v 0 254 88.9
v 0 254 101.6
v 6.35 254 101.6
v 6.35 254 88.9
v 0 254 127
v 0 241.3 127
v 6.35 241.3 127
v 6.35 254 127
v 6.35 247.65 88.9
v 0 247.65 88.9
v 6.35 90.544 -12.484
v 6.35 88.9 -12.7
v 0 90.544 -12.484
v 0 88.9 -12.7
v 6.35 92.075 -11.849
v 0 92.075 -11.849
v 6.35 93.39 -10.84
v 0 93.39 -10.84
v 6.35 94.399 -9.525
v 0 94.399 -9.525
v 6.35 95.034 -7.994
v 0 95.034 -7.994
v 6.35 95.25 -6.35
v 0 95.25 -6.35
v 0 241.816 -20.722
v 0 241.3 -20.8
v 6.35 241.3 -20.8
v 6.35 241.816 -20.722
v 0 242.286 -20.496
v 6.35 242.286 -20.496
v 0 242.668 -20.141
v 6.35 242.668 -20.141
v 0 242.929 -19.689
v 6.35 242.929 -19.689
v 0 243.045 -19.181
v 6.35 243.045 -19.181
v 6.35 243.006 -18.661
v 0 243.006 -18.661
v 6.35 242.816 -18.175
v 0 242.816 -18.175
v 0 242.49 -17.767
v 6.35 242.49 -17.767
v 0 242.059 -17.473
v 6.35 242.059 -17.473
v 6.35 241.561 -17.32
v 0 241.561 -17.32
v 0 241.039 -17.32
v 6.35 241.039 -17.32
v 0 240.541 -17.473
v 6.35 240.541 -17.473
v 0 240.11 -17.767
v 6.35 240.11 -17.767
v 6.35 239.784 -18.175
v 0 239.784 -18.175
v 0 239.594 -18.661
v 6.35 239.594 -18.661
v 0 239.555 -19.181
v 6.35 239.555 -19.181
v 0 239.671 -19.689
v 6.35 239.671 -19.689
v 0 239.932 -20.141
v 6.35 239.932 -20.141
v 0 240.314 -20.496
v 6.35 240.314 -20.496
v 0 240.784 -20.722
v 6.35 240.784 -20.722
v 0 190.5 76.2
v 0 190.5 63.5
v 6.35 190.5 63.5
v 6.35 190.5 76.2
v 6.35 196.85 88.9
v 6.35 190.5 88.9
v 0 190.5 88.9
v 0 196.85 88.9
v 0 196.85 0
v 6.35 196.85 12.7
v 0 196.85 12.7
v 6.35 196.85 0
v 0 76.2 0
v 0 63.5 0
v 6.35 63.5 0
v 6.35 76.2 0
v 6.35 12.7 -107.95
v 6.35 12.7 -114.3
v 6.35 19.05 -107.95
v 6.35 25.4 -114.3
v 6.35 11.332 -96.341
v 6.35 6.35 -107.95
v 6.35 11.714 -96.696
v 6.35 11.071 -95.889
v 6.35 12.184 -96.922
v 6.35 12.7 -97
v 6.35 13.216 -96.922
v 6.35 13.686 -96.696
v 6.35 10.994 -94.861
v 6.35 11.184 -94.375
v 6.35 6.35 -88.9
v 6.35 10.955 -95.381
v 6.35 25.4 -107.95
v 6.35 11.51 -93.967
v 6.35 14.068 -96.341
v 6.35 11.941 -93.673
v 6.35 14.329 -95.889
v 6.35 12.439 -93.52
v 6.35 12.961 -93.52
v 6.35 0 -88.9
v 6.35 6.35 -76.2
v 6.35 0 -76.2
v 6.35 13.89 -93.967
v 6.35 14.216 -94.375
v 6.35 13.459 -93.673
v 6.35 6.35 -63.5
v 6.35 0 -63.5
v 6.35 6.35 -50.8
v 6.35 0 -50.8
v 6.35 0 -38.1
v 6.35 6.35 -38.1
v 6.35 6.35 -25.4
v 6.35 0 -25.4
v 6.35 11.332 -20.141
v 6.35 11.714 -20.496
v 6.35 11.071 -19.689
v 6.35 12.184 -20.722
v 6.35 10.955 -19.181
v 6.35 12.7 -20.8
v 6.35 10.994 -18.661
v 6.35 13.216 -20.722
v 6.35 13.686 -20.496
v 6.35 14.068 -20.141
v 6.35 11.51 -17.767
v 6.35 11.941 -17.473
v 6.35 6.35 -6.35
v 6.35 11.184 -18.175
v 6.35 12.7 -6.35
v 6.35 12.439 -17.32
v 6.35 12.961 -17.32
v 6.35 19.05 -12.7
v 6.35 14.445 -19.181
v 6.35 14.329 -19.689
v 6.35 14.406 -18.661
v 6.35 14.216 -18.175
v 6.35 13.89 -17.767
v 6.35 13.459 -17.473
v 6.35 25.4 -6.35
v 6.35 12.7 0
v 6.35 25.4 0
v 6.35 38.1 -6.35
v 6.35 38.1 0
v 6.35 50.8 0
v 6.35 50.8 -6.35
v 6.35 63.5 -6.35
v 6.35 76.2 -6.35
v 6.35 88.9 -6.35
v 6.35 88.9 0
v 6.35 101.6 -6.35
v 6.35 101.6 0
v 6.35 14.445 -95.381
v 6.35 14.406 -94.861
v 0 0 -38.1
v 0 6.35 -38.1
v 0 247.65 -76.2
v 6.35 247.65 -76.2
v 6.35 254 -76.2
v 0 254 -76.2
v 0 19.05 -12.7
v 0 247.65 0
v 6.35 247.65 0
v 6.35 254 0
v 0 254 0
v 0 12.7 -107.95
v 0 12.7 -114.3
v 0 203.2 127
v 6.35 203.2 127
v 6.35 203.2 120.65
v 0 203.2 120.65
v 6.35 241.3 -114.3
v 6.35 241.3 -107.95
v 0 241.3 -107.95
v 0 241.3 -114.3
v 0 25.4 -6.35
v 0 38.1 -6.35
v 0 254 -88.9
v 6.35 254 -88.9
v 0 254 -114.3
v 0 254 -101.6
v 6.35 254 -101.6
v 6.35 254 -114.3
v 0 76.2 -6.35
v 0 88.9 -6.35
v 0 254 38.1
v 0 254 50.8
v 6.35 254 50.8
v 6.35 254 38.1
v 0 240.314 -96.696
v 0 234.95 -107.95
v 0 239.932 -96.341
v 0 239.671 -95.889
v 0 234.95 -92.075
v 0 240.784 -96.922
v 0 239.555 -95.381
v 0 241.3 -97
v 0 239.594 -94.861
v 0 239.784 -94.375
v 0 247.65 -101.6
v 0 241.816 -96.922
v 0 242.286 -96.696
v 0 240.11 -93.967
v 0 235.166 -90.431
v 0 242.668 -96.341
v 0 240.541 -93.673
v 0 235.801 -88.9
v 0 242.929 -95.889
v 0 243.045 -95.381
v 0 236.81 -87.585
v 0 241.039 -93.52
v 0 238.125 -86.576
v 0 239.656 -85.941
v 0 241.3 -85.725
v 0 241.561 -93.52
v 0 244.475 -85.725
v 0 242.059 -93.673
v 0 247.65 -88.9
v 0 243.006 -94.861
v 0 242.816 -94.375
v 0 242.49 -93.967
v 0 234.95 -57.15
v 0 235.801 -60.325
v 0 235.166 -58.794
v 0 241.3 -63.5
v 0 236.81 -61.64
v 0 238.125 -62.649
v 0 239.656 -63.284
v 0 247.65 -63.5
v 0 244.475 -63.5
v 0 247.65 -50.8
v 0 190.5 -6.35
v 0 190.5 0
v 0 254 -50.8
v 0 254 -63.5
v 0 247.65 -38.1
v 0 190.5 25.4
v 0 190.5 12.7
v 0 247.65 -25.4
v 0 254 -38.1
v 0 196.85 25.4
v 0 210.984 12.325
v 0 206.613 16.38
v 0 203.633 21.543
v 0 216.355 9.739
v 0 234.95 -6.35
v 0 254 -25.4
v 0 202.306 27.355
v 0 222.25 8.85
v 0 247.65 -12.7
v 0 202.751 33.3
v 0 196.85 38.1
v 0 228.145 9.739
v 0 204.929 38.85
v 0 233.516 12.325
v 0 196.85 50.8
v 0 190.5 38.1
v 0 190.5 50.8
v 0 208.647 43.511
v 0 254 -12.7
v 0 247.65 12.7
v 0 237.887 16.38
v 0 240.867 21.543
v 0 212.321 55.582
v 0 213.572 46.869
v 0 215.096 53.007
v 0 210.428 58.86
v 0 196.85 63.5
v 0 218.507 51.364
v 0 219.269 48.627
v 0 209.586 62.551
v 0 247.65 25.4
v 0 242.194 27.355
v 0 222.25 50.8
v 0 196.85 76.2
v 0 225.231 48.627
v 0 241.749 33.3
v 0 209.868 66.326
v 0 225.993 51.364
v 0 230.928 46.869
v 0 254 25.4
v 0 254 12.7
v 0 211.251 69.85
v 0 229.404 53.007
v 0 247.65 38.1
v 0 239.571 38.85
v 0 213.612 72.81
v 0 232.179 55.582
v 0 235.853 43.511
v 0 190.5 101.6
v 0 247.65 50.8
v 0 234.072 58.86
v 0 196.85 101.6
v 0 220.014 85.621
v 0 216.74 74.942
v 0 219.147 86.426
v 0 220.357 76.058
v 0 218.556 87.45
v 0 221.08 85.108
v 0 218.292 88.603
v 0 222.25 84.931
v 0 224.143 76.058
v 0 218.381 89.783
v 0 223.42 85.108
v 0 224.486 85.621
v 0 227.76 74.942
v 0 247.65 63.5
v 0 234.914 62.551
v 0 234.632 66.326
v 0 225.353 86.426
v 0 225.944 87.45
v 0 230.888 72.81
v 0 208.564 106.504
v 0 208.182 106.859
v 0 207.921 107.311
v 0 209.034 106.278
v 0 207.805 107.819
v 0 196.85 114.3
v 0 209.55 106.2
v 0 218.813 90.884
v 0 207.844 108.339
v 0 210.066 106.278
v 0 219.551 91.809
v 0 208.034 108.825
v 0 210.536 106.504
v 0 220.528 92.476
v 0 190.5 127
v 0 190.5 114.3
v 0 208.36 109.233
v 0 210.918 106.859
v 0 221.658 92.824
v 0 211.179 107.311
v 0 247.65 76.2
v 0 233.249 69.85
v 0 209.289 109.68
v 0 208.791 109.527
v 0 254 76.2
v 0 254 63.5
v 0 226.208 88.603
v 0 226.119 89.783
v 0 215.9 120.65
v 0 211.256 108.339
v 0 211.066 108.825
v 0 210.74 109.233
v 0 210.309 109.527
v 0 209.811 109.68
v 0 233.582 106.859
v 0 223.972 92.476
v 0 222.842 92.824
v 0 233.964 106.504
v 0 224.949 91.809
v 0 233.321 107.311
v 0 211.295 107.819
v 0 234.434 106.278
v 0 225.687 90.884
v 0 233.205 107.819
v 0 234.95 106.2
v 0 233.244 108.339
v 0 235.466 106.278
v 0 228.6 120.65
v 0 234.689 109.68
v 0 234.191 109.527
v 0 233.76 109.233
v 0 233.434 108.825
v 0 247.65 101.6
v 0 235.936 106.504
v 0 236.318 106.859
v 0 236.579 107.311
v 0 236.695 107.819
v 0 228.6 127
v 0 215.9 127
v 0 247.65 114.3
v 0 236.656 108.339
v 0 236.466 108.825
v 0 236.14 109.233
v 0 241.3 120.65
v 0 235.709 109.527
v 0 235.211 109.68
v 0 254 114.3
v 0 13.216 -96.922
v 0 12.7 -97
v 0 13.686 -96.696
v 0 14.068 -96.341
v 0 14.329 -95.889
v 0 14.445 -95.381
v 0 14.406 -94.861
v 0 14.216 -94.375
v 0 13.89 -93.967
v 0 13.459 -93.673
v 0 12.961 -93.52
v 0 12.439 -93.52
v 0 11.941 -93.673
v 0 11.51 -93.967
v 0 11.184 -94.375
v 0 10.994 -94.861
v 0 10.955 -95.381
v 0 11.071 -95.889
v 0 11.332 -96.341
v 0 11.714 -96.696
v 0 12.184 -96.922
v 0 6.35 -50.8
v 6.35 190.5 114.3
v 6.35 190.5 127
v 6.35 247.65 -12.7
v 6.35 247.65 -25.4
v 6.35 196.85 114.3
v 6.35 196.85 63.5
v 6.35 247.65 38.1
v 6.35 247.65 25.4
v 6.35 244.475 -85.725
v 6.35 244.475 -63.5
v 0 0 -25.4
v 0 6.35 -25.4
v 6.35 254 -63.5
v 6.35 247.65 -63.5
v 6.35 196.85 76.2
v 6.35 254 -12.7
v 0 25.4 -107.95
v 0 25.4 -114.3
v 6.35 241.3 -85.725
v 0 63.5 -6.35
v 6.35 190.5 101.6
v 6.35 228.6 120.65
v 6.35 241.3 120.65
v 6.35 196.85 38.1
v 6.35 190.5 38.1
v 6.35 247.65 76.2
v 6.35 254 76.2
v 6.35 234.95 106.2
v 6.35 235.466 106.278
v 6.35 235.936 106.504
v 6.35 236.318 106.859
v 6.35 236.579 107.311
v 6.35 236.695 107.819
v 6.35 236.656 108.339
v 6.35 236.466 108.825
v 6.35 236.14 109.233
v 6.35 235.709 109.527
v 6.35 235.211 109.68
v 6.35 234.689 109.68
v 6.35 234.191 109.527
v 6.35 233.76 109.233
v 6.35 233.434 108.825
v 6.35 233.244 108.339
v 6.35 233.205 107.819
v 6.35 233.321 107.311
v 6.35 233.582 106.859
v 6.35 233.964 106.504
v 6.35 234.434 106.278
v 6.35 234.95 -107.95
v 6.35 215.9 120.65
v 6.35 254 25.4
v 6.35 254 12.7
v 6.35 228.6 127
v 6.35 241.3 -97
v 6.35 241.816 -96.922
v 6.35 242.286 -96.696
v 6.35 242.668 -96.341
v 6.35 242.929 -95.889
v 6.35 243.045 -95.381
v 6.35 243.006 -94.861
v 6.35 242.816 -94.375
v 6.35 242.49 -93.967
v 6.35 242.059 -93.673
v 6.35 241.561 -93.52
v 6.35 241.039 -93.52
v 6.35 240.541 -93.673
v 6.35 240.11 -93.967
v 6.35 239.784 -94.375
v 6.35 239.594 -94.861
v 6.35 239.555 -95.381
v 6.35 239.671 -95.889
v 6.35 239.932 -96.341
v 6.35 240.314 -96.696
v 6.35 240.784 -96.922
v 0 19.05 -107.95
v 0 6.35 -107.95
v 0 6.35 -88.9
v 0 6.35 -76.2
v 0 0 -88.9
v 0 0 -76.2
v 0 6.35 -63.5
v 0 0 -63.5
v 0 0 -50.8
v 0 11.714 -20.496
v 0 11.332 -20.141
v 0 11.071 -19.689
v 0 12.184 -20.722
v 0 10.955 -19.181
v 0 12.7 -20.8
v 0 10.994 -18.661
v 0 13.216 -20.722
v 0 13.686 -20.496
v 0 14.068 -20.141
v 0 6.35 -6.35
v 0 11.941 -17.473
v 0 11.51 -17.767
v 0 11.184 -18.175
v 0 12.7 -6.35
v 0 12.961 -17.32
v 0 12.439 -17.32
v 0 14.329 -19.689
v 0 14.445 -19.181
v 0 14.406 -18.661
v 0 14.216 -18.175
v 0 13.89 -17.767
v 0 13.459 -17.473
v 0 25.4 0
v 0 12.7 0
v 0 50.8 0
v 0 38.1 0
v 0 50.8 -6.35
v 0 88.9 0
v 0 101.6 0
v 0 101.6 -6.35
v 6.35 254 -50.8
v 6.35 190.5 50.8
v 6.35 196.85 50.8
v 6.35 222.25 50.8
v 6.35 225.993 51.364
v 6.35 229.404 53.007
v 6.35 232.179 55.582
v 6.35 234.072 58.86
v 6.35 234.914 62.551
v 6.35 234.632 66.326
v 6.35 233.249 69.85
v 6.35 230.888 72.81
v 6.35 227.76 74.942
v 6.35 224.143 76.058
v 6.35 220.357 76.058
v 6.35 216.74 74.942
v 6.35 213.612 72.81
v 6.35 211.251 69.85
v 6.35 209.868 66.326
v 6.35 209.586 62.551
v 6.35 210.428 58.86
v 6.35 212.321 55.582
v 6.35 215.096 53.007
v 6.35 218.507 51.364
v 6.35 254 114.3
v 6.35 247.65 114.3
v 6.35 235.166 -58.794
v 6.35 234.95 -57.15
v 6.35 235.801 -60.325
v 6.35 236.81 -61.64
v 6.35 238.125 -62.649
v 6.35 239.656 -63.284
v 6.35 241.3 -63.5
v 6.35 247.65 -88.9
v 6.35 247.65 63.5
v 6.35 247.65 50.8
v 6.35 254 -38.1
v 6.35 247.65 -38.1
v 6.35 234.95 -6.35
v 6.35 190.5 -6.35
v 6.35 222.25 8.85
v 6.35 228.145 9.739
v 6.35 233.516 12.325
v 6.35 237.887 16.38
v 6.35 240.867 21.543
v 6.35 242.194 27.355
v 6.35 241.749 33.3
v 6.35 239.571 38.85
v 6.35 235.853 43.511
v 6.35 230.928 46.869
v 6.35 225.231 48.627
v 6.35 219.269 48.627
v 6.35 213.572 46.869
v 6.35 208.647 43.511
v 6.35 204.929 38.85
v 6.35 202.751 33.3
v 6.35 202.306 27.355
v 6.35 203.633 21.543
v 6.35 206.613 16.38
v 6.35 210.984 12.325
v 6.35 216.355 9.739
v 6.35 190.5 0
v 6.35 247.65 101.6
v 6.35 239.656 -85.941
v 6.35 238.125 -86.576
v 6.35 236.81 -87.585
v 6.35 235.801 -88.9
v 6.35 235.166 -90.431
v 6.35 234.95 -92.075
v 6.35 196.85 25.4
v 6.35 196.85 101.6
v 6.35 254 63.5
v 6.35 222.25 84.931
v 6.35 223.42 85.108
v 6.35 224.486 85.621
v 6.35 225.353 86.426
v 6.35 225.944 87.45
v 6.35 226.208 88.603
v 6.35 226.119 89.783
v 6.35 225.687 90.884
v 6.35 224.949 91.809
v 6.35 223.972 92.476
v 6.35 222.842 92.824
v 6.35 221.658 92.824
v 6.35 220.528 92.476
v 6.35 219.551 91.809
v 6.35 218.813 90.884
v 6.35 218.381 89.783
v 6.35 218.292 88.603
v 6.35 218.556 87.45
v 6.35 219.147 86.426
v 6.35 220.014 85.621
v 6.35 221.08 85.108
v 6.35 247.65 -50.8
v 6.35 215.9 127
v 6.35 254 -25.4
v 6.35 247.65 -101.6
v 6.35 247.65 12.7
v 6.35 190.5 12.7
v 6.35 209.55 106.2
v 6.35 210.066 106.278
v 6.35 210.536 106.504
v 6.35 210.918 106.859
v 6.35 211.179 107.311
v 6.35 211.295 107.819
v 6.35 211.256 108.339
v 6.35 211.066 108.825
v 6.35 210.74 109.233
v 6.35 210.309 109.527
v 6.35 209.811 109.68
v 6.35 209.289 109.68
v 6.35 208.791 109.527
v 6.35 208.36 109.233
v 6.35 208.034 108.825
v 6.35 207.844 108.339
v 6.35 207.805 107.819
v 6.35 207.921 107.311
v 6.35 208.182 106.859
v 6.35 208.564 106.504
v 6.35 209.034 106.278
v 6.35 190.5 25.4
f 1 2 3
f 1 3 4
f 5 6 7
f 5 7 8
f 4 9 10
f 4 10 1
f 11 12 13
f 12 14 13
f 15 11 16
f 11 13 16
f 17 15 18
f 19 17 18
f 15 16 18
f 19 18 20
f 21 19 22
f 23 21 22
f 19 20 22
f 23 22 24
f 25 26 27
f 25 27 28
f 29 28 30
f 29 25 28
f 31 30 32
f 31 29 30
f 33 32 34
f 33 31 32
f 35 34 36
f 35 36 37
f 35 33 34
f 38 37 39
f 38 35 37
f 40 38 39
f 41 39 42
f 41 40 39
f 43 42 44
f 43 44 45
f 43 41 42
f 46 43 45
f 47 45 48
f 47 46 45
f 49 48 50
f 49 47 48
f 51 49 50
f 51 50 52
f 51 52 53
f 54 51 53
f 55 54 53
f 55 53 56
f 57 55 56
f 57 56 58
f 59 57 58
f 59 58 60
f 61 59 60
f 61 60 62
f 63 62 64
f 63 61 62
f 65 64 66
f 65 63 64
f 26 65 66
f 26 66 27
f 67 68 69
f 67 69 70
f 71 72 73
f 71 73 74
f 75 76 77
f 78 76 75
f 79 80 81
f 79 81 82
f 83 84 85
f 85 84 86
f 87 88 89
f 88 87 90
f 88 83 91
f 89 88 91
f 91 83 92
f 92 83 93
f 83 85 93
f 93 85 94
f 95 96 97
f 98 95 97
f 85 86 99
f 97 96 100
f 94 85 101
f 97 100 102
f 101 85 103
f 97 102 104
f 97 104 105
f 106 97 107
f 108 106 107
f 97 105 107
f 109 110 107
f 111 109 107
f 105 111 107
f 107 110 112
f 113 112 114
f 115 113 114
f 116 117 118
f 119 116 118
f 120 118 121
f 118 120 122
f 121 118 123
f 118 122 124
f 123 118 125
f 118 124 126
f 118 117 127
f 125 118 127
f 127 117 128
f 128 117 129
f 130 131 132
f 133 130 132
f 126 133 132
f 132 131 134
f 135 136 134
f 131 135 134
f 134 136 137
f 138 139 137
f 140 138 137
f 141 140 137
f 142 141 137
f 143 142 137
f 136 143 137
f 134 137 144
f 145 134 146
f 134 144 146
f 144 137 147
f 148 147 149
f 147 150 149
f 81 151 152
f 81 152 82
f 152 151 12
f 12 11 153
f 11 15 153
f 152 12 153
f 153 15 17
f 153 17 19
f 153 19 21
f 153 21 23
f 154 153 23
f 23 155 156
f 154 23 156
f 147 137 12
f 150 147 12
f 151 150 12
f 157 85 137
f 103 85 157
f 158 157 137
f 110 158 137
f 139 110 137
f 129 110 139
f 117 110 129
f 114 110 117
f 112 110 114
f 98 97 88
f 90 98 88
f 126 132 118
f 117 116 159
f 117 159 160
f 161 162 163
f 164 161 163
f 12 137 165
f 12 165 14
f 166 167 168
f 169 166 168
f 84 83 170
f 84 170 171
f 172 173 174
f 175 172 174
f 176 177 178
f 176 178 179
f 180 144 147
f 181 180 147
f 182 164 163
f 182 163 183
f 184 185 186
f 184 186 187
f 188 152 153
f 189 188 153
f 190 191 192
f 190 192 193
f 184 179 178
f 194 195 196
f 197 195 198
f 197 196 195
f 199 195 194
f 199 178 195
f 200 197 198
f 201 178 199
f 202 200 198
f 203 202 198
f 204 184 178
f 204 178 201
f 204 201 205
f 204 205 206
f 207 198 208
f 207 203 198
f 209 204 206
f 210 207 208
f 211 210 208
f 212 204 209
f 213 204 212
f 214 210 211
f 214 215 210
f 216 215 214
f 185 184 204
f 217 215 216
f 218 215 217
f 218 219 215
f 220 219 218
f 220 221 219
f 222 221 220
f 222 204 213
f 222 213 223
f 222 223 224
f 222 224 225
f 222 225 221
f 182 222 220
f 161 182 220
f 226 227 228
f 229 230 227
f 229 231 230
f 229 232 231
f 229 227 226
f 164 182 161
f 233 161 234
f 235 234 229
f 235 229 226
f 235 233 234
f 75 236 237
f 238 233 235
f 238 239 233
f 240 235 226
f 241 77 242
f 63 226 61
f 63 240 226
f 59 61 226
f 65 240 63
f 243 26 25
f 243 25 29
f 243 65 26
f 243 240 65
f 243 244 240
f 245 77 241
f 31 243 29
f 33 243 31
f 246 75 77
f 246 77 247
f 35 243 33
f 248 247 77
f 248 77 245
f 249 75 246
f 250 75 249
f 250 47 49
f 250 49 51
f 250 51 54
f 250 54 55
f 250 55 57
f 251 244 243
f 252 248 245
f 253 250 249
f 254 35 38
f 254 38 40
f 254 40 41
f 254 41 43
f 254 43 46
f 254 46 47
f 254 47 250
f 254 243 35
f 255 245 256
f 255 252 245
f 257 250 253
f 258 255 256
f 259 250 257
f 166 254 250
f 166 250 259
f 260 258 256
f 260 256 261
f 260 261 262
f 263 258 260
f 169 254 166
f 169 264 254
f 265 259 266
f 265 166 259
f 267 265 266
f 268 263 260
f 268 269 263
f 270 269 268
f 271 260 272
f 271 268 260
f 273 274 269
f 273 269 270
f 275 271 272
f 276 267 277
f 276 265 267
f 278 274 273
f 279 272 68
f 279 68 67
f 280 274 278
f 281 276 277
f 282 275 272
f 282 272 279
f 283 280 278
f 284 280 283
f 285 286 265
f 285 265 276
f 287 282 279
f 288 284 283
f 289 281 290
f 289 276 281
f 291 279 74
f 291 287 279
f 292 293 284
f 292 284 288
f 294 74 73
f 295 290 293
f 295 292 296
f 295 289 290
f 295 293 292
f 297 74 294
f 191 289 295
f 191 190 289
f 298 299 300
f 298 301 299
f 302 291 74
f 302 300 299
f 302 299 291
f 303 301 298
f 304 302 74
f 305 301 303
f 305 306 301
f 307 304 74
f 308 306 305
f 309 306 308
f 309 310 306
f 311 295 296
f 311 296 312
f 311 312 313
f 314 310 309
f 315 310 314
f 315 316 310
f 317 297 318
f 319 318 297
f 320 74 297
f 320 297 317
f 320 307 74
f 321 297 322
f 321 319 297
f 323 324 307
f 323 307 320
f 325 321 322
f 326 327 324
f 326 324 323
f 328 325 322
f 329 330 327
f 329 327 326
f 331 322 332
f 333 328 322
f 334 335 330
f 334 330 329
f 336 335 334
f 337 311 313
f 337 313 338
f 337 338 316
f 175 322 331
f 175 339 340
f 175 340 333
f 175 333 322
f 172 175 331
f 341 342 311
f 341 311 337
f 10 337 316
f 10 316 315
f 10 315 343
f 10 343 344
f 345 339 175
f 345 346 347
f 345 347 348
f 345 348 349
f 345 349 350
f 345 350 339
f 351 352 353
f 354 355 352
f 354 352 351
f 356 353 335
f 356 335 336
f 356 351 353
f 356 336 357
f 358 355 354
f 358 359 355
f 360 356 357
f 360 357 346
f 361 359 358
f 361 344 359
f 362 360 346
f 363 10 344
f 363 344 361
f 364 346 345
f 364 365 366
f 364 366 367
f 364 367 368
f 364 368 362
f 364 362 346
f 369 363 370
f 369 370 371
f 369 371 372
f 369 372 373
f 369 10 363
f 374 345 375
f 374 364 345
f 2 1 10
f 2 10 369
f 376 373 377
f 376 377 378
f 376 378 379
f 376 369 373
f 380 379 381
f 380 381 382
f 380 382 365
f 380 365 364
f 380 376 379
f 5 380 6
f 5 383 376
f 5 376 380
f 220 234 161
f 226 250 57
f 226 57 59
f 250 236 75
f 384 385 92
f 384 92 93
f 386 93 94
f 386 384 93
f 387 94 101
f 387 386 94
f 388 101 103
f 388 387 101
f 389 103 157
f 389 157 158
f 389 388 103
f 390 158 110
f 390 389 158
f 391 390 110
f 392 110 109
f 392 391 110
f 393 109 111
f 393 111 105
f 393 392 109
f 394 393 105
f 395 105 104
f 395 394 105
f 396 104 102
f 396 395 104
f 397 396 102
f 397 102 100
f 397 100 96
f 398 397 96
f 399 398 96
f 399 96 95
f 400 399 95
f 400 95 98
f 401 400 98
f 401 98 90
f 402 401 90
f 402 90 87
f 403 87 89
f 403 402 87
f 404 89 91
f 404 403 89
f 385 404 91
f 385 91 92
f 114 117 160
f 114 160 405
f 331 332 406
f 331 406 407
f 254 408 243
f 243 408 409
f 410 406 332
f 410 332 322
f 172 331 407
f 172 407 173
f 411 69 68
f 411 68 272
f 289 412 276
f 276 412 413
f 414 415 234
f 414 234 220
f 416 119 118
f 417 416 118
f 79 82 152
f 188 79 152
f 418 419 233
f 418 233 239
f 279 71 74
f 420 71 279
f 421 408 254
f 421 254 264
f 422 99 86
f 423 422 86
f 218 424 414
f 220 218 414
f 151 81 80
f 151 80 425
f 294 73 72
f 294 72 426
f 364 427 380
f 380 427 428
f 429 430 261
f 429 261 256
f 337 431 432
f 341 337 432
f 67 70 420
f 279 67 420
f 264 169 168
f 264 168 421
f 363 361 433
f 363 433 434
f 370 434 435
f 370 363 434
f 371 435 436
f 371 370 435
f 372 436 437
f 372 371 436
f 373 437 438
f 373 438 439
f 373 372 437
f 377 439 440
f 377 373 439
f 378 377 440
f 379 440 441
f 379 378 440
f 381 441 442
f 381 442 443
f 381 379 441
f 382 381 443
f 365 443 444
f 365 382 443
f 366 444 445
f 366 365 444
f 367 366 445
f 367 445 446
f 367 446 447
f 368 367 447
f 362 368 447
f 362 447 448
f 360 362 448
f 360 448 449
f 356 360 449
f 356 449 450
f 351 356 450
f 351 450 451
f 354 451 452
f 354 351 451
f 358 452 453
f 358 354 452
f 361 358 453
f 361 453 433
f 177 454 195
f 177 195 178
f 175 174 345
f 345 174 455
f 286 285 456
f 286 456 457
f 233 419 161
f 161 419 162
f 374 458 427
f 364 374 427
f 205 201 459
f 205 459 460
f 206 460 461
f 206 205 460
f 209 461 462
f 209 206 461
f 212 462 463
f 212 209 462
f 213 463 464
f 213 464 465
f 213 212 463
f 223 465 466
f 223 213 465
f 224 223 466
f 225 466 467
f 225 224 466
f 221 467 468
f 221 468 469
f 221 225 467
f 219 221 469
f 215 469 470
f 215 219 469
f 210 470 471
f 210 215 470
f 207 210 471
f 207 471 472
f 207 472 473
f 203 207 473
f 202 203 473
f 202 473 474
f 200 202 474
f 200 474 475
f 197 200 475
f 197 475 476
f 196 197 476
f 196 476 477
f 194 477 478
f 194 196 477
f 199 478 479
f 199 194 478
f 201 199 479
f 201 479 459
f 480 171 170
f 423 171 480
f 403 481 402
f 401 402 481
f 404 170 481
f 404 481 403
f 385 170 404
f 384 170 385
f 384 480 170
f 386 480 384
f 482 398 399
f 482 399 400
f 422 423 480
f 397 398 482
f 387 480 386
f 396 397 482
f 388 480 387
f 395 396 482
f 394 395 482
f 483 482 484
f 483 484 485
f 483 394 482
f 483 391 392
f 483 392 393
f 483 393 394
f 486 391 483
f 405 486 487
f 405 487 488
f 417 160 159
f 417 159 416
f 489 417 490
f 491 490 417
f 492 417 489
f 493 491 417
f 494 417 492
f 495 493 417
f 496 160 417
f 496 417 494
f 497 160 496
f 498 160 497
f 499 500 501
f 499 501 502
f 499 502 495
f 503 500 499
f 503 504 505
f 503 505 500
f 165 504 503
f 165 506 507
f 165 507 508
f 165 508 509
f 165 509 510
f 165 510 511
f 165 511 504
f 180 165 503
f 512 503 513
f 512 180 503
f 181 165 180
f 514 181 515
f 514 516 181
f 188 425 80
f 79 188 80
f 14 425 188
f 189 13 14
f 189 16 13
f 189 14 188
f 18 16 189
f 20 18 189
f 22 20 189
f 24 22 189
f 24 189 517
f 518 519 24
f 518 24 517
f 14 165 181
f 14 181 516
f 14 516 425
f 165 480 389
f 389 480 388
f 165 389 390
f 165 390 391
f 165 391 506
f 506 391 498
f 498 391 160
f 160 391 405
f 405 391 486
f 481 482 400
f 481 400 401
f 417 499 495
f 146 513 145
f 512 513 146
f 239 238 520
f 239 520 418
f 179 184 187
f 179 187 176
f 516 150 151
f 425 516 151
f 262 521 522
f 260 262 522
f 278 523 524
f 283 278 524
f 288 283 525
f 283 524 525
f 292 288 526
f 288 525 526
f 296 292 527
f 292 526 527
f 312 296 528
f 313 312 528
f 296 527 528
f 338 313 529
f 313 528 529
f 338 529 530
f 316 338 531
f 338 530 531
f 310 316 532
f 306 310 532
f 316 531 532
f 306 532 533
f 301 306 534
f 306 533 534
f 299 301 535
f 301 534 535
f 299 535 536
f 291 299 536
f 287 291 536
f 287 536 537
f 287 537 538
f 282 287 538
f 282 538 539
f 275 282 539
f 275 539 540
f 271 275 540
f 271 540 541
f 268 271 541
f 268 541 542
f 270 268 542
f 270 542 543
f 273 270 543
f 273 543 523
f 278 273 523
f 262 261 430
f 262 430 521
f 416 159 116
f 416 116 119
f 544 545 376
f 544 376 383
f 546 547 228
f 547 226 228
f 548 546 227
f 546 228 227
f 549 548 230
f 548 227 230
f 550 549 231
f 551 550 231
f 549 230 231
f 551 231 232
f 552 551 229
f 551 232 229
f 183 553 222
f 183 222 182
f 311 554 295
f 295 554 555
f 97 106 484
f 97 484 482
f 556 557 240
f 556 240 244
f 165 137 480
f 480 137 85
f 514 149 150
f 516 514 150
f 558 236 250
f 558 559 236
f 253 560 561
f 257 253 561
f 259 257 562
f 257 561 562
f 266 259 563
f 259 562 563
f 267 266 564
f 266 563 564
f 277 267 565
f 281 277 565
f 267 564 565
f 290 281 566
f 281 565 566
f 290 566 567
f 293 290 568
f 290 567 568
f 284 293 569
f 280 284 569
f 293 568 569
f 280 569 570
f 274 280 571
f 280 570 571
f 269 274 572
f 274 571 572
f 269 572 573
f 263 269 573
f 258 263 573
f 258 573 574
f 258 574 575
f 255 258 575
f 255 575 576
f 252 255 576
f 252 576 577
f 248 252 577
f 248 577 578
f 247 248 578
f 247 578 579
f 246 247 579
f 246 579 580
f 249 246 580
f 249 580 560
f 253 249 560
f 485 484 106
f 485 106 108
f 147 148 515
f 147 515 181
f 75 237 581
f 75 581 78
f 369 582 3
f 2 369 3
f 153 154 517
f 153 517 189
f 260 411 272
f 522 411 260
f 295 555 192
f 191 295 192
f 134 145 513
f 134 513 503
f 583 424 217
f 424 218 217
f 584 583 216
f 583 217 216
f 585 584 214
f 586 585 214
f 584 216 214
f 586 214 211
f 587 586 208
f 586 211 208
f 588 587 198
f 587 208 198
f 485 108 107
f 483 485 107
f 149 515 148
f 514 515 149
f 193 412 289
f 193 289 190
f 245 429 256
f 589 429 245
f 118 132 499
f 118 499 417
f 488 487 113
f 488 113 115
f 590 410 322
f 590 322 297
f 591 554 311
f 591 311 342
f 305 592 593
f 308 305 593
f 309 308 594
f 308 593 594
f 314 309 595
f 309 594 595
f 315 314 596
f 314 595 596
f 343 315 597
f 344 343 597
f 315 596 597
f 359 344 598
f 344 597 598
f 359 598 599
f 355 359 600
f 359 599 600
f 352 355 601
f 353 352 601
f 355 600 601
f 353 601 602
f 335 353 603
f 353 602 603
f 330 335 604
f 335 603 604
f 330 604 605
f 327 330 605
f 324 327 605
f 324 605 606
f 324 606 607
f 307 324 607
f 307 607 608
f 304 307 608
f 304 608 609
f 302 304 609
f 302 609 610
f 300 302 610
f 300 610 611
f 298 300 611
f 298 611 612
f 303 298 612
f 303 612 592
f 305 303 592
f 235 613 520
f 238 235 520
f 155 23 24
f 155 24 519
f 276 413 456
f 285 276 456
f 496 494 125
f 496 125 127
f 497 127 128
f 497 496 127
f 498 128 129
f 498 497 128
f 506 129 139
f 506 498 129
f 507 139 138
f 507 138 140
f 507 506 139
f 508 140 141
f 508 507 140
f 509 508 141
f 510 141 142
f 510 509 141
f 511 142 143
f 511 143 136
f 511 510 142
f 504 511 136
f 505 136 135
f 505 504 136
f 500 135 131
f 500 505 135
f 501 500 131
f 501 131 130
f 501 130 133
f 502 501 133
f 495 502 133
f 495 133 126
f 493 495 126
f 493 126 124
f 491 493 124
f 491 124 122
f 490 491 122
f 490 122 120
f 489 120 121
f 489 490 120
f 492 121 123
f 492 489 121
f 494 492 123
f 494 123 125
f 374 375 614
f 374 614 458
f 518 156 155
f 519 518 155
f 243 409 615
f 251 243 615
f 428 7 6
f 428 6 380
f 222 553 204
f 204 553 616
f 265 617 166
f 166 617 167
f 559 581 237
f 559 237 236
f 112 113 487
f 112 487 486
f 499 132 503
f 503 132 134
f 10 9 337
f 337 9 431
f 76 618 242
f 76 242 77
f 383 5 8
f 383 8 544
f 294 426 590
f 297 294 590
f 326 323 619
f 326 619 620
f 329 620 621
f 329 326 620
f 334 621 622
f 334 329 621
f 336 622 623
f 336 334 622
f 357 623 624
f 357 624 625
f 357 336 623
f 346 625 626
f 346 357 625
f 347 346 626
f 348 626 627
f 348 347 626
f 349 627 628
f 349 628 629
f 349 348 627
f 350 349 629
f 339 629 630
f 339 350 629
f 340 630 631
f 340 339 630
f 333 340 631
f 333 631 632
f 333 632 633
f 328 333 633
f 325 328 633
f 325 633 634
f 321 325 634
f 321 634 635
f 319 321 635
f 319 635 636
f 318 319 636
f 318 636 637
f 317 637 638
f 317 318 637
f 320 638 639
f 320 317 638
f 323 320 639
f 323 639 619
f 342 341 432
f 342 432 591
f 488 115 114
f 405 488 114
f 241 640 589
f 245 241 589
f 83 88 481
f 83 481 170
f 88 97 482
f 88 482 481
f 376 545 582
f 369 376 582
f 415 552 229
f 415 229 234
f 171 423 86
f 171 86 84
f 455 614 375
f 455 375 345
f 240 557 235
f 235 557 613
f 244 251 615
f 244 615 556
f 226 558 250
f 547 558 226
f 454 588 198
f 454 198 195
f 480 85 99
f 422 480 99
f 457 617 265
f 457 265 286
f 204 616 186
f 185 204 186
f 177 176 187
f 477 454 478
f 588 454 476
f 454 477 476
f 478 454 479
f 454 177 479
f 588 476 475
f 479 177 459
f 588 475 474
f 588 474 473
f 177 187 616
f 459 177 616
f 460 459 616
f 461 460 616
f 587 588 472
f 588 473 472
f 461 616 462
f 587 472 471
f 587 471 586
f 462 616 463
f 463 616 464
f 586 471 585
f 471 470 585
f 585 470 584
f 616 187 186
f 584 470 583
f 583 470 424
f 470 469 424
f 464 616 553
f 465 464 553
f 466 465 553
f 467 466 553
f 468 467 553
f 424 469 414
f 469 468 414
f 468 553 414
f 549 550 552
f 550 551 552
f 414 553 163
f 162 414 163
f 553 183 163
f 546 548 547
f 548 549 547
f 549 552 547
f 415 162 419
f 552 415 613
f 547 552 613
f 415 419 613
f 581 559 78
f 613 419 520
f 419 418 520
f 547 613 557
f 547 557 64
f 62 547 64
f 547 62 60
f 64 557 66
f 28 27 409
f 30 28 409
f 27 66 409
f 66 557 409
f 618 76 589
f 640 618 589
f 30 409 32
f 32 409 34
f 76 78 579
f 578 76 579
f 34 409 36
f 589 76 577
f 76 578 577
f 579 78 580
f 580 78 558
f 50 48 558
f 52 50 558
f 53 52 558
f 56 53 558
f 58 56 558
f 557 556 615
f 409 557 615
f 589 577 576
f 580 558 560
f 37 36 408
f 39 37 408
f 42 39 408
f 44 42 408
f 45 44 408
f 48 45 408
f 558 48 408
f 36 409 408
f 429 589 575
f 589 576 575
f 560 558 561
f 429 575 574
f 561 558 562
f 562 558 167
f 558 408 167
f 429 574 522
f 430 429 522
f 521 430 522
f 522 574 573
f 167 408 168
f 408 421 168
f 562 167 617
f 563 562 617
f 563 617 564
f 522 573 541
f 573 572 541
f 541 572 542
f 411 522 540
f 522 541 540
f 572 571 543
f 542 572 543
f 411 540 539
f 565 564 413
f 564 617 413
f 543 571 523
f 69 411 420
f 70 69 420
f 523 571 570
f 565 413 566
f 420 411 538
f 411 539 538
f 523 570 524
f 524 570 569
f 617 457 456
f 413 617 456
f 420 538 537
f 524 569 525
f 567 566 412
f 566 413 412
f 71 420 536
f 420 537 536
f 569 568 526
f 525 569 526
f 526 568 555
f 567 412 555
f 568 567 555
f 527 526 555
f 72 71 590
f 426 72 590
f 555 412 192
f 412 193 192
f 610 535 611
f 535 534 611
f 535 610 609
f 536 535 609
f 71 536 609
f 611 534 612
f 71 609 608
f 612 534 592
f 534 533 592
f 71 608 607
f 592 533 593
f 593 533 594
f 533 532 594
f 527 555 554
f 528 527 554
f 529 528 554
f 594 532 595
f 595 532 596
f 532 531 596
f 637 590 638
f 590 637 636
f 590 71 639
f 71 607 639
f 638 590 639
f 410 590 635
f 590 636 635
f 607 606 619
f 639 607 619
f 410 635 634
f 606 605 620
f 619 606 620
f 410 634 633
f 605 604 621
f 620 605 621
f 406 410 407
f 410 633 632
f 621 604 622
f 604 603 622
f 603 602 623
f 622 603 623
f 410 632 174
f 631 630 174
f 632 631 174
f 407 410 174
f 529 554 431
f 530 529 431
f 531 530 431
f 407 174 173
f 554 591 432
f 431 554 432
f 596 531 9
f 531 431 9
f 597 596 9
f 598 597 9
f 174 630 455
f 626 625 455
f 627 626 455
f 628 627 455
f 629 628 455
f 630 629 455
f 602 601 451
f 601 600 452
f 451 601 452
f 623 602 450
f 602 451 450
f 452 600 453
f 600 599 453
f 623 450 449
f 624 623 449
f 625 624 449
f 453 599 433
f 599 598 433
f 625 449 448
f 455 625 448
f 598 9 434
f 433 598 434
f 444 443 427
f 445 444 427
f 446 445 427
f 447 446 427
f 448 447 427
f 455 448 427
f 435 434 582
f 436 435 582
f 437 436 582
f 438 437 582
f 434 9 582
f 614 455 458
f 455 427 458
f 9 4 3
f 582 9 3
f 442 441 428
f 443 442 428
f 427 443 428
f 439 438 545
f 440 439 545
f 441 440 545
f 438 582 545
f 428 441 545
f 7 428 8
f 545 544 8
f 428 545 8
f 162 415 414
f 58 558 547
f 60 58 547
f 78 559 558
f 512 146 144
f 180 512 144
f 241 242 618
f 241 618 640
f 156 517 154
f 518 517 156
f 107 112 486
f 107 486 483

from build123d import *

# Parameters (mm, degrees)
SKETCH1_R           = 1.75
BOSS_EXTRUDE1_DEPTH = 6.35
SKETCH2_W           = 12.7
SKETCH2_H           = 6.35
CUT_EXTRUDE1_DEPTH  = 285.051619429
LPATTERN1_COUNT     = 10
LPATTERN1_PITCH     = 25.4
SKETCH3_W           = 6.35
SKETCH3_H           = 12.7
CUT_EXTRUDE2_DEPTH  = 285.051619429
LPATTERN2_COUNT     = 10
LPATTERN2_PITCH     = 25.4
SKETCH4_W           = 6.35
SKETCH4_H           = 12.7
CUT_EXTRUDE3_DEPTH  = 285.051619429
SKETCH5_W           = 12.7
SKETCH5_H           = 6.35
CUT_EXTRUDE4_DEPTH  = 285.051619429
LPATTERN3_COUNT     = 5
LPATTERN3_PITCH     = 25.4
SKETCH6_W           = 6.35
SKETCH6_H           = 12.7
CUT_EXTRUDE5_DEPTH  = 285.051619429
LPATTERN4_COUNT     = 8
LPATTERN4_PITCH     = 25.4
SKETCH7_W           = 12.7
SKETCH7_H           = 6.35
CUT_EXTRUDE6_DEPTH  = 285.051619429
SKETCH8_W           = 6.35
SKETCH8_H           = 6.35
CUT_EXTRUDE7_DEPTH  = 285.051619429
SKETCH9_W           = 88.9
SKETCH9_H           = 215.9
CUT_EXTRUDE8_DEPTH  = 285.051619429
SKETCH10_R          = 3.96875
CUT_EXTRUDE9_DEPTH  = 285.051619429
SKETCH12_R          = 12.7
CUT_EXTRUDE11_DEPTH = 285.051619429
SKETCH13_R          = 20
CUT_EXTRUDE12_DEPTH = 285.051619429
SKETCH14_W          = 6.35
SKETCH14_H          = 139.7
SKETCH14_W_2        = 22.225
SKETCH14_H_2        = 9.525
SKETCH14_H_3        = 215.9
CUT_EXTRUDE14_DEPTH = 285.051619429
SKETCH15_W          = 6.35
SKETCH15_H          = 101.6
CUT_EXTRUDE15_DEPTH = 285.051619429
FILLET1_R           = 6.35
SKETCH16_W          = 29.62248357
SKETCH16_H          = 194.777974162
SKETCH16_W_2        = 38.14401994
SKETCH16_H_2        = 73.853315203
CUT_EXTRUDE16_DEPTH = 285.051619429
FILLET2_R           = 6.35


with BuildPart() as part:
    # Sketch1 → Boss-Extrude1 (new body)
    with BuildSketch(Plane(origin=(0, 0, 0), x_dir=(0, 0, -1), z_dir=(1, 0, 0))):
        Polygon((0, 0), (0, 190.5), (-127, 190.5), (-127, 254), (114.3, 254), (114.3, 0), align=None)
        with Locations((-107.95, 234.95)):
            Circle(SKETCH1_R, mode=Mode.SUBTRACT)
        with Locations((-107.95, 209.55)):
            Circle(SKETCH1_R, mode=Mode.SUBTRACT)
        with Locations((19.05, 241.3)):
            Circle(SKETCH1_R, mode=Mode.SUBTRACT)
        with Locations((95.25, 241.3)):
            Circle(SKETCH1_R, mode=Mode.SUBTRACT)
        with Locations((19.05, 12.7)):
            Circle(SKETCH1_R, mode=Mode.SUBTRACT)
        with Locations((95.25, 12.7)):
            Circle(SKETCH1_R, mode=Mode.SUBTRACT)
    extrude(amount=BOSS_EXTRUDE1_DEPTH)

    # Sketch2 → Cut-Extrude1 (cut, through all)
    with BuildSketch(Plane(origin=(6.35, 0, 0), x_dir=(0, 0, -1), z_dir=(1, 0, 0))):
        with Locations((-107.95, 250.825)):
            Rectangle(SKETCH2_W, SKETCH2_H)
    cut_extrude1 = extrude(amount=-CUT_EXTRUDE1_DEPTH, mode=Mode.SUBTRACT)

    # LPattern1: Cut-Extrude1 ×10
    with Locations(*[(0, 0, -i * LPATTERN1_PITCH) for i in range(1, LPATTERN1_COUNT)]):
        add(cut_extrude1, mode=Mode.SUBTRACT)

    # Sketch3 → Cut-Extrude2 (cut, through all)
    with BuildSketch(Plane(origin=(6.35, 0, 0), x_dir=(0, 0, -1), z_dir=(1, 0, 0))):
        with Locations((111.125, 234.95)):
            Rectangle(SKETCH3_W, SKETCH3_H)
    cut_extrude2 = extrude(amount=-CUT_EXTRUDE2_DEPTH, mode=Mode.SUBTRACT)

    # LPattern2: Cut-Extrude2 ×10
    with Locations(*[(0, -i * LPATTERN2_PITCH, 0) for i in range(1, LPATTERN2_COUNT)]):
        add(cut_extrude2, mode=Mode.SUBTRACT)

    # Sketch4 → Cut-Extrude3 (cut, through all)
    with BuildSketch(Plane(origin=(6.35, 0, 0), x_dir=(0, 0, -1), z_dir=(1, 0, 0))):
        with Locations((-123.825, 234.95)):
            Rectangle(SKETCH4_W, SKETCH4_H)
        with Locations((-123.825, 209.55)):
            Rectangle(SKETCH4_W, SKETCH4_H)
    extrude(amount=-CUT_EXTRUDE3_DEPTH, mode=Mode.SUBTRACT)

    # Sketch5 → Cut-Extrude4 (cut, through all)
    with BuildSketch(Plane(origin=(6.35, 0, 0), x_dir=(0, 0, -1), z_dir=(1, 0, 0))):
        with Locations((-107.95, 193.675)):
            Rectangle(SKETCH5_W, SKETCH5_H)
    cut_extrude4 = extrude(amount=-CUT_EXTRUDE4_DEPTH, mode=Mode.SUBTRACT)

    # LPattern3: Cut-Extrude4 ×5
    with Locations(*[(0, 0, -i * LPATTERN3_PITCH) for i in range(1, LPATTERN3_COUNT)]):
        add(cut_extrude4, mode=Mode.SUBTRACT)

    # Sketch6 → Cut-Extrude5 (cut, through all)
    with BuildSketch(Plane(origin=(6.35, 0, 0), x_dir=(0, 0, -1), z_dir=(1, 0, 0))):
        with Locations((3.175, 6.35)):
            Rectangle(SKETCH6_W, SKETCH6_H)
    cut_extrude5 = extrude(amount=-CUT_EXTRUDE5_DEPTH, mode=Mode.SUBTRACT)

    # LPattern4: Cut-Extrude5 ×8
    with Locations(*[(0, i * LPATTERN4_PITCH, 0) for i in range(1, LPATTERN4_COUNT)]):
        add(cut_extrude5, mode=Mode.SUBTRACT)

    # Sketch7 → Cut-Extrude6 (cut, through all)
    with BuildSketch(Plane(origin=(6.35, 0, 0), x_dir=(0, 0, -1), z_dir=(1, 0, 0))):
        with Locations((19.05, 3.175)):
            Rectangle(SKETCH7_W, SKETCH7_H)
        with Locations((44.45, 3.175)):
            Rectangle(SKETCH7_W, SKETCH7_H)
        with Locations((69.85, 3.175)):
            Rectangle(SKETCH7_W, SKETCH7_H)
        with Locations((95.25, 3.175)):
            Rectangle(SKETCH7_W, SKETCH7_H)
    extrude(amount=-CUT_EXTRUDE6_DEPTH, mode=Mode.SUBTRACT)

    # Sketch8 → Cut-Extrude7 (cut, through all)
    with BuildSketch(Plane(origin=(6.35, 0, 0), x_dir=(0, 0, -1), z_dir=(1, 0, 0))):
        with Locations((9.525, 3.175)):
            Rectangle(SKETCH8_W, SKETCH8_H)
        with Locations((104.775, 3.175)):
            Rectangle(SKETCH8_W, SKETCH8_H)
    extrude(amount=-CUT_EXTRUDE7_DEPTH, mode=Mode.SUBTRACT)

    # Sketch9 → Cut-Extrude8 (cut, through all)
    with BuildSketch(Plane(origin=(6.35, 0, 0), x_dir=(0, 0, -1), z_dir=(1, 0, 0))):
        with Locations((57.15, 127)):
            Rectangle(SKETCH9_W, SKETCH9_H)
    extrude(amount=-CUT_EXTRUDE8_DEPTH, mode=Mode.SUBTRACT)

    # Sketch10 → Cut-Extrude9 (cut, through all)
    with BuildSketch(Plane(origin=(6.35, 0, 0), x_dir=(0, 0, -1), z_dir=(1, 0, 0))):
        with Locations((-88.9, 222.25)):
            Circle(SKETCH10_R)
    extrude(amount=-CUT_EXTRUDE9_DEPTH, mode=Mode.SUBTRACT)

    # Sketch12 → Cut-Extrude11 (cut, through all)
    with BuildSketch(Plane(origin=(6.35, 0, 0), x_dir=(0, 0, -1), z_dir=(1, 0, 0))):
        with Locations((-63.5, 222.25)):
            Circle(SKETCH12_R)
    extrude(amount=-CUT_EXTRUDE11_DEPTH, mode=Mode.SUBTRACT)

    # Sketch13 → Cut-Extrude12 (cut, through all)
    with BuildSketch(Plane(origin=(6.35, 0, 0), x_dir=(0, 0, -1), z_dir=(1, 0, 0))):
        with Locations((-28.849999958, 222.25)):
            Circle(SKETCH13_R)
    extrude(amount=-CUT_EXTRUDE12_DEPTH, mode=Mode.SUBTRACT)

    # Sketch14 → Cut-Extrude14 (cut, through all)
    with BuildSketch(Plane(origin=(6.35, 0, 0), x_dir=(0, 0, -1), z_dir=(1, 0, 0))):
        with Locations((9.525, 165.1)):
            Rectangle(SKETCH14_W, SKETCH14_H)
        with Locations((74.6125, 239.7125)):
            Rectangle(SKETCH14_W_2, SKETCH14_H_2)
        with Locations((104.775, 127)):
            Rectangle(SKETCH14_W, SKETCH14_H_3)
    extrude(amount=-CUT_EXTRUDE14_DEPTH, mode=Mode.SUBTRACT)


with BuildPart() as cut_extrude14_piece_1:
    # of the separate pieces the step leaves, piece 1, a body of its own (cut_extrude14_pieces)
    add(part.part.solids().sort_by_distance((0, 234.95, -107.95))[0])

    # Fillet1
    fillet1_edges = [cut_extrude14_piece_1.edges().sort_by_distance(p)[0] for p in [
        (3.175, 234.95, -63.5),
        (3.175, 234.95, -85.725),
    ]]
    fillet(fillet1_edges, radius=FILLET1_R)


with BuildPart() as cut_extrude14_piece_2:
    # of the separate pieces the step leaves, piece 2, a body of its own (cut_extrude14_pieces)
    add(part.part.solids().sort_by_distance((6.35, 63.5, 0))[0])

    # Fillet2
    fillet2_edges = [cut_extrude14_piece_2.edges().sort_by_distance(p)[0] for p in [
        (3.175, 95.25, -12.7),
    ]]
    fillet(fillet2_edges, radius=FILLET2_R - 0.0001)  # a hair under: the kernel refuses the full size


with BuildPart() as cut_extrude14_piece_3:
    # of the separate pieces the step leaves, piece 3, a body of its own (cut_extrude14_pieces)
    add(part.part.solids().sort_by_distance((0, 38.1, -107.95))[0])


with BuildPart() as cut_extrude14_piece_4:
    # of the separate pieces the step leaves, piece 4, a body of its own (cut_extrude14_pieces)
    add(part.part.solids().sort_by_distance((0, 139.7, -107.95))[0])


with BuildPart() as cut_extrude14_piece_5:
    # of the separate pieces the step leaves, piece 5, a body of its own (cut_extrude14_pieces)
    add(part.part.solids().sort_by_distance((0, 114.3, -107.95))[0])


with BuildPart() as cut_extrude14_piece_6:
    # of the separate pieces the step leaves, piece 6, a body of its own (cut_extrude14_pieces)
    add(part.part.solids().sort_by_distance((0, 190.5, -107.95))[0])


with BuildPart() as cut_extrude14_piece_7:
    # of the separate pieces the step leaves, piece 7, a body of its own (cut_extrude14_pieces)
    add(part.part.solids().sort_by_distance((0, 215.9, -107.95))[0])


with BuildPart() as cut_extrude14_piece_8:
    # of the separate pieces the step leaves, piece 8, a body of its own (cut_extrude14_pieces)
    add(part.part.solids().sort_by_distance((0, 63.5, -107.95))[0])


with BuildPart() as cut_extrude14_piece_9:
    # of the separate pieces the step leaves, piece 9, a body of its own (cut_extrude14_pieces)
    add(part.part.solids().sort_by_distance((0, 165.1, -107.95))[0])


with BuildPart() as cut_extrude14_piece_10:
    # of the separate pieces the step leaves, piece 10, a body of its own (cut_extrude14_pieces)
    add(part.part.solids().sort_by_distance((0, 88.9, -107.95))[0])


with BuildPart() as cut_extrude14_piece_11:
    # of the separate pieces the step leaves, piece 11, a body of its own (cut_extrude14_pieces)
    add(part.part.solids().sort_by_distance((0, 177.8, -6.35))[0])


with BuildPart() as cut_extrude14_piece_12:
    # of the separate pieces the step leaves, piece 12, a body of its own (cut_extrude14_pieces)
    add(part.part.solids().sort_by_distance((0, 127, -6.35))[0])


with BuildPart() as cut_extrude14_piece_13:
    # of the separate pieces the step leaves, piece 13, a body of its own (cut_extrude14_pieces)
    add(part.part.solids().sort_by_distance((0, 152.4, -6.35))[0])


with BuildPart() as cut_extrude15_tool:
    # Sketch15 → Cut-Extrude15 (new, through all)
    with BuildSketch(Plane(origin=(6.35, 0, 0), x_dir=(0, 0, -1), z_dir=(1, 0, 0))):
        with Locations((111.125, 114.3)):
            Rectangle(SKETCH15_W, SKETCH15_H)
    extrude(amount=-CUT_EXTRUDE15_DEPTH)


with BuildPart() as cut_extrude14_piece_4_1:
    add(cut_extrude14_piece_4.part)

    # Cut-Extrude15: cut by cut_extrude15_tool
    add(cut_extrude15_tool.part, mode=Mode.SUBTRACT)


with BuildPart() as cut_extrude14_piece_5_1:
    add(cut_extrude14_piece_5.part)

    # Cut-Extrude15: cut by cut_extrude15_tool
    add(cut_extrude15_tool.part, mode=Mode.SUBTRACT)


with BuildPart() as cut_extrude14_piece_8_1:
    add(cut_extrude14_piece_8.part)

    # Cut-Extrude15: cut by cut_extrude15_tool
    add(cut_extrude15_tool.part, mode=Mode.SUBTRACT)


with BuildPart() as cut_extrude14_piece_10_1:
    add(cut_extrude14_piece_10.part)

    # Cut-Extrude15: cut by cut_extrude15_tool
    add(cut_extrude15_tool.part, mode=Mode.SUBTRACT)


with BuildPart() as cut_extrude16_tool:
    # Sketch16 → Cut-Extrude16 (new, through all)
    with BuildSketch(Plane(origin=(6.35, 0, 0), x_dir=(0, 0, -1), z_dir=(1, 0, 0))):
        with Locations((111.610650232, 133.672166478)):
            Rectangle(SKETCH16_W, SKETCH16_H)
        with Locations((5.091445612, 147.063152203)):
            Rectangle(SKETCH16_W_2, SKETCH16_H_2)
    extrude(amount=-CUT_EXTRUDE16_DEPTH)


with BuildPart() as cut_extrude14_piece_3_1:
    add(cut_extrude14_piece_3.part)

    # Cut-Extrude16: cut by cut_extrude16_tool
    add(cut_extrude16_tool.part, mode=Mode.SUBTRACT)


with BuildPart() as cut_extrude14_piece_6_1:
    add(cut_extrude14_piece_6.part)

    # Cut-Extrude16: cut by cut_extrude16_tool
    add(cut_extrude16_tool.part, mode=Mode.SUBTRACT)


with BuildPart() as cut_extrude14_piece_7_1:
    add(cut_extrude14_piece_7.part)

    # Cut-Extrude16: cut by cut_extrude16_tool
    add(cut_extrude16_tool.part, mode=Mode.SUBTRACT)


with BuildPart() as cut_extrude14_piece_9_1:
    add(cut_extrude14_piece_9.part)

    # Cut-Extrude16: cut by cut_extrude16_tool
    add(cut_extrude16_tool.part, mode=Mode.SUBTRACT)


with BuildPart() as cut_extrude14_piece_11_1:
    add(cut_extrude14_piece_11.part)

    # Cut-Extrude16: cut by cut_extrude16_tool
    add(cut_extrude16_tool.part, mode=Mode.SUBTRACT)


with BuildPart() as cut_extrude14_piece_12_1:
    add(cut_extrude14_piece_12.part)

    # Cut-Extrude16: cut by cut_extrude16_tool
    add(cut_extrude16_tool.part, mode=Mode.SUBTRACT)


with BuildPart() as cut_extrude14_piece_13_1:
    add(cut_extrude14_piece_13.part)

    # Cut-Extrude16: cut by cut_extrude16_tool
    add(cut_extrude16_tool.part, mode=Mode.SUBTRACT)


solid = Compound([cut_extrude14_piece_1.part, cut_extrude14_piece_2.part])
